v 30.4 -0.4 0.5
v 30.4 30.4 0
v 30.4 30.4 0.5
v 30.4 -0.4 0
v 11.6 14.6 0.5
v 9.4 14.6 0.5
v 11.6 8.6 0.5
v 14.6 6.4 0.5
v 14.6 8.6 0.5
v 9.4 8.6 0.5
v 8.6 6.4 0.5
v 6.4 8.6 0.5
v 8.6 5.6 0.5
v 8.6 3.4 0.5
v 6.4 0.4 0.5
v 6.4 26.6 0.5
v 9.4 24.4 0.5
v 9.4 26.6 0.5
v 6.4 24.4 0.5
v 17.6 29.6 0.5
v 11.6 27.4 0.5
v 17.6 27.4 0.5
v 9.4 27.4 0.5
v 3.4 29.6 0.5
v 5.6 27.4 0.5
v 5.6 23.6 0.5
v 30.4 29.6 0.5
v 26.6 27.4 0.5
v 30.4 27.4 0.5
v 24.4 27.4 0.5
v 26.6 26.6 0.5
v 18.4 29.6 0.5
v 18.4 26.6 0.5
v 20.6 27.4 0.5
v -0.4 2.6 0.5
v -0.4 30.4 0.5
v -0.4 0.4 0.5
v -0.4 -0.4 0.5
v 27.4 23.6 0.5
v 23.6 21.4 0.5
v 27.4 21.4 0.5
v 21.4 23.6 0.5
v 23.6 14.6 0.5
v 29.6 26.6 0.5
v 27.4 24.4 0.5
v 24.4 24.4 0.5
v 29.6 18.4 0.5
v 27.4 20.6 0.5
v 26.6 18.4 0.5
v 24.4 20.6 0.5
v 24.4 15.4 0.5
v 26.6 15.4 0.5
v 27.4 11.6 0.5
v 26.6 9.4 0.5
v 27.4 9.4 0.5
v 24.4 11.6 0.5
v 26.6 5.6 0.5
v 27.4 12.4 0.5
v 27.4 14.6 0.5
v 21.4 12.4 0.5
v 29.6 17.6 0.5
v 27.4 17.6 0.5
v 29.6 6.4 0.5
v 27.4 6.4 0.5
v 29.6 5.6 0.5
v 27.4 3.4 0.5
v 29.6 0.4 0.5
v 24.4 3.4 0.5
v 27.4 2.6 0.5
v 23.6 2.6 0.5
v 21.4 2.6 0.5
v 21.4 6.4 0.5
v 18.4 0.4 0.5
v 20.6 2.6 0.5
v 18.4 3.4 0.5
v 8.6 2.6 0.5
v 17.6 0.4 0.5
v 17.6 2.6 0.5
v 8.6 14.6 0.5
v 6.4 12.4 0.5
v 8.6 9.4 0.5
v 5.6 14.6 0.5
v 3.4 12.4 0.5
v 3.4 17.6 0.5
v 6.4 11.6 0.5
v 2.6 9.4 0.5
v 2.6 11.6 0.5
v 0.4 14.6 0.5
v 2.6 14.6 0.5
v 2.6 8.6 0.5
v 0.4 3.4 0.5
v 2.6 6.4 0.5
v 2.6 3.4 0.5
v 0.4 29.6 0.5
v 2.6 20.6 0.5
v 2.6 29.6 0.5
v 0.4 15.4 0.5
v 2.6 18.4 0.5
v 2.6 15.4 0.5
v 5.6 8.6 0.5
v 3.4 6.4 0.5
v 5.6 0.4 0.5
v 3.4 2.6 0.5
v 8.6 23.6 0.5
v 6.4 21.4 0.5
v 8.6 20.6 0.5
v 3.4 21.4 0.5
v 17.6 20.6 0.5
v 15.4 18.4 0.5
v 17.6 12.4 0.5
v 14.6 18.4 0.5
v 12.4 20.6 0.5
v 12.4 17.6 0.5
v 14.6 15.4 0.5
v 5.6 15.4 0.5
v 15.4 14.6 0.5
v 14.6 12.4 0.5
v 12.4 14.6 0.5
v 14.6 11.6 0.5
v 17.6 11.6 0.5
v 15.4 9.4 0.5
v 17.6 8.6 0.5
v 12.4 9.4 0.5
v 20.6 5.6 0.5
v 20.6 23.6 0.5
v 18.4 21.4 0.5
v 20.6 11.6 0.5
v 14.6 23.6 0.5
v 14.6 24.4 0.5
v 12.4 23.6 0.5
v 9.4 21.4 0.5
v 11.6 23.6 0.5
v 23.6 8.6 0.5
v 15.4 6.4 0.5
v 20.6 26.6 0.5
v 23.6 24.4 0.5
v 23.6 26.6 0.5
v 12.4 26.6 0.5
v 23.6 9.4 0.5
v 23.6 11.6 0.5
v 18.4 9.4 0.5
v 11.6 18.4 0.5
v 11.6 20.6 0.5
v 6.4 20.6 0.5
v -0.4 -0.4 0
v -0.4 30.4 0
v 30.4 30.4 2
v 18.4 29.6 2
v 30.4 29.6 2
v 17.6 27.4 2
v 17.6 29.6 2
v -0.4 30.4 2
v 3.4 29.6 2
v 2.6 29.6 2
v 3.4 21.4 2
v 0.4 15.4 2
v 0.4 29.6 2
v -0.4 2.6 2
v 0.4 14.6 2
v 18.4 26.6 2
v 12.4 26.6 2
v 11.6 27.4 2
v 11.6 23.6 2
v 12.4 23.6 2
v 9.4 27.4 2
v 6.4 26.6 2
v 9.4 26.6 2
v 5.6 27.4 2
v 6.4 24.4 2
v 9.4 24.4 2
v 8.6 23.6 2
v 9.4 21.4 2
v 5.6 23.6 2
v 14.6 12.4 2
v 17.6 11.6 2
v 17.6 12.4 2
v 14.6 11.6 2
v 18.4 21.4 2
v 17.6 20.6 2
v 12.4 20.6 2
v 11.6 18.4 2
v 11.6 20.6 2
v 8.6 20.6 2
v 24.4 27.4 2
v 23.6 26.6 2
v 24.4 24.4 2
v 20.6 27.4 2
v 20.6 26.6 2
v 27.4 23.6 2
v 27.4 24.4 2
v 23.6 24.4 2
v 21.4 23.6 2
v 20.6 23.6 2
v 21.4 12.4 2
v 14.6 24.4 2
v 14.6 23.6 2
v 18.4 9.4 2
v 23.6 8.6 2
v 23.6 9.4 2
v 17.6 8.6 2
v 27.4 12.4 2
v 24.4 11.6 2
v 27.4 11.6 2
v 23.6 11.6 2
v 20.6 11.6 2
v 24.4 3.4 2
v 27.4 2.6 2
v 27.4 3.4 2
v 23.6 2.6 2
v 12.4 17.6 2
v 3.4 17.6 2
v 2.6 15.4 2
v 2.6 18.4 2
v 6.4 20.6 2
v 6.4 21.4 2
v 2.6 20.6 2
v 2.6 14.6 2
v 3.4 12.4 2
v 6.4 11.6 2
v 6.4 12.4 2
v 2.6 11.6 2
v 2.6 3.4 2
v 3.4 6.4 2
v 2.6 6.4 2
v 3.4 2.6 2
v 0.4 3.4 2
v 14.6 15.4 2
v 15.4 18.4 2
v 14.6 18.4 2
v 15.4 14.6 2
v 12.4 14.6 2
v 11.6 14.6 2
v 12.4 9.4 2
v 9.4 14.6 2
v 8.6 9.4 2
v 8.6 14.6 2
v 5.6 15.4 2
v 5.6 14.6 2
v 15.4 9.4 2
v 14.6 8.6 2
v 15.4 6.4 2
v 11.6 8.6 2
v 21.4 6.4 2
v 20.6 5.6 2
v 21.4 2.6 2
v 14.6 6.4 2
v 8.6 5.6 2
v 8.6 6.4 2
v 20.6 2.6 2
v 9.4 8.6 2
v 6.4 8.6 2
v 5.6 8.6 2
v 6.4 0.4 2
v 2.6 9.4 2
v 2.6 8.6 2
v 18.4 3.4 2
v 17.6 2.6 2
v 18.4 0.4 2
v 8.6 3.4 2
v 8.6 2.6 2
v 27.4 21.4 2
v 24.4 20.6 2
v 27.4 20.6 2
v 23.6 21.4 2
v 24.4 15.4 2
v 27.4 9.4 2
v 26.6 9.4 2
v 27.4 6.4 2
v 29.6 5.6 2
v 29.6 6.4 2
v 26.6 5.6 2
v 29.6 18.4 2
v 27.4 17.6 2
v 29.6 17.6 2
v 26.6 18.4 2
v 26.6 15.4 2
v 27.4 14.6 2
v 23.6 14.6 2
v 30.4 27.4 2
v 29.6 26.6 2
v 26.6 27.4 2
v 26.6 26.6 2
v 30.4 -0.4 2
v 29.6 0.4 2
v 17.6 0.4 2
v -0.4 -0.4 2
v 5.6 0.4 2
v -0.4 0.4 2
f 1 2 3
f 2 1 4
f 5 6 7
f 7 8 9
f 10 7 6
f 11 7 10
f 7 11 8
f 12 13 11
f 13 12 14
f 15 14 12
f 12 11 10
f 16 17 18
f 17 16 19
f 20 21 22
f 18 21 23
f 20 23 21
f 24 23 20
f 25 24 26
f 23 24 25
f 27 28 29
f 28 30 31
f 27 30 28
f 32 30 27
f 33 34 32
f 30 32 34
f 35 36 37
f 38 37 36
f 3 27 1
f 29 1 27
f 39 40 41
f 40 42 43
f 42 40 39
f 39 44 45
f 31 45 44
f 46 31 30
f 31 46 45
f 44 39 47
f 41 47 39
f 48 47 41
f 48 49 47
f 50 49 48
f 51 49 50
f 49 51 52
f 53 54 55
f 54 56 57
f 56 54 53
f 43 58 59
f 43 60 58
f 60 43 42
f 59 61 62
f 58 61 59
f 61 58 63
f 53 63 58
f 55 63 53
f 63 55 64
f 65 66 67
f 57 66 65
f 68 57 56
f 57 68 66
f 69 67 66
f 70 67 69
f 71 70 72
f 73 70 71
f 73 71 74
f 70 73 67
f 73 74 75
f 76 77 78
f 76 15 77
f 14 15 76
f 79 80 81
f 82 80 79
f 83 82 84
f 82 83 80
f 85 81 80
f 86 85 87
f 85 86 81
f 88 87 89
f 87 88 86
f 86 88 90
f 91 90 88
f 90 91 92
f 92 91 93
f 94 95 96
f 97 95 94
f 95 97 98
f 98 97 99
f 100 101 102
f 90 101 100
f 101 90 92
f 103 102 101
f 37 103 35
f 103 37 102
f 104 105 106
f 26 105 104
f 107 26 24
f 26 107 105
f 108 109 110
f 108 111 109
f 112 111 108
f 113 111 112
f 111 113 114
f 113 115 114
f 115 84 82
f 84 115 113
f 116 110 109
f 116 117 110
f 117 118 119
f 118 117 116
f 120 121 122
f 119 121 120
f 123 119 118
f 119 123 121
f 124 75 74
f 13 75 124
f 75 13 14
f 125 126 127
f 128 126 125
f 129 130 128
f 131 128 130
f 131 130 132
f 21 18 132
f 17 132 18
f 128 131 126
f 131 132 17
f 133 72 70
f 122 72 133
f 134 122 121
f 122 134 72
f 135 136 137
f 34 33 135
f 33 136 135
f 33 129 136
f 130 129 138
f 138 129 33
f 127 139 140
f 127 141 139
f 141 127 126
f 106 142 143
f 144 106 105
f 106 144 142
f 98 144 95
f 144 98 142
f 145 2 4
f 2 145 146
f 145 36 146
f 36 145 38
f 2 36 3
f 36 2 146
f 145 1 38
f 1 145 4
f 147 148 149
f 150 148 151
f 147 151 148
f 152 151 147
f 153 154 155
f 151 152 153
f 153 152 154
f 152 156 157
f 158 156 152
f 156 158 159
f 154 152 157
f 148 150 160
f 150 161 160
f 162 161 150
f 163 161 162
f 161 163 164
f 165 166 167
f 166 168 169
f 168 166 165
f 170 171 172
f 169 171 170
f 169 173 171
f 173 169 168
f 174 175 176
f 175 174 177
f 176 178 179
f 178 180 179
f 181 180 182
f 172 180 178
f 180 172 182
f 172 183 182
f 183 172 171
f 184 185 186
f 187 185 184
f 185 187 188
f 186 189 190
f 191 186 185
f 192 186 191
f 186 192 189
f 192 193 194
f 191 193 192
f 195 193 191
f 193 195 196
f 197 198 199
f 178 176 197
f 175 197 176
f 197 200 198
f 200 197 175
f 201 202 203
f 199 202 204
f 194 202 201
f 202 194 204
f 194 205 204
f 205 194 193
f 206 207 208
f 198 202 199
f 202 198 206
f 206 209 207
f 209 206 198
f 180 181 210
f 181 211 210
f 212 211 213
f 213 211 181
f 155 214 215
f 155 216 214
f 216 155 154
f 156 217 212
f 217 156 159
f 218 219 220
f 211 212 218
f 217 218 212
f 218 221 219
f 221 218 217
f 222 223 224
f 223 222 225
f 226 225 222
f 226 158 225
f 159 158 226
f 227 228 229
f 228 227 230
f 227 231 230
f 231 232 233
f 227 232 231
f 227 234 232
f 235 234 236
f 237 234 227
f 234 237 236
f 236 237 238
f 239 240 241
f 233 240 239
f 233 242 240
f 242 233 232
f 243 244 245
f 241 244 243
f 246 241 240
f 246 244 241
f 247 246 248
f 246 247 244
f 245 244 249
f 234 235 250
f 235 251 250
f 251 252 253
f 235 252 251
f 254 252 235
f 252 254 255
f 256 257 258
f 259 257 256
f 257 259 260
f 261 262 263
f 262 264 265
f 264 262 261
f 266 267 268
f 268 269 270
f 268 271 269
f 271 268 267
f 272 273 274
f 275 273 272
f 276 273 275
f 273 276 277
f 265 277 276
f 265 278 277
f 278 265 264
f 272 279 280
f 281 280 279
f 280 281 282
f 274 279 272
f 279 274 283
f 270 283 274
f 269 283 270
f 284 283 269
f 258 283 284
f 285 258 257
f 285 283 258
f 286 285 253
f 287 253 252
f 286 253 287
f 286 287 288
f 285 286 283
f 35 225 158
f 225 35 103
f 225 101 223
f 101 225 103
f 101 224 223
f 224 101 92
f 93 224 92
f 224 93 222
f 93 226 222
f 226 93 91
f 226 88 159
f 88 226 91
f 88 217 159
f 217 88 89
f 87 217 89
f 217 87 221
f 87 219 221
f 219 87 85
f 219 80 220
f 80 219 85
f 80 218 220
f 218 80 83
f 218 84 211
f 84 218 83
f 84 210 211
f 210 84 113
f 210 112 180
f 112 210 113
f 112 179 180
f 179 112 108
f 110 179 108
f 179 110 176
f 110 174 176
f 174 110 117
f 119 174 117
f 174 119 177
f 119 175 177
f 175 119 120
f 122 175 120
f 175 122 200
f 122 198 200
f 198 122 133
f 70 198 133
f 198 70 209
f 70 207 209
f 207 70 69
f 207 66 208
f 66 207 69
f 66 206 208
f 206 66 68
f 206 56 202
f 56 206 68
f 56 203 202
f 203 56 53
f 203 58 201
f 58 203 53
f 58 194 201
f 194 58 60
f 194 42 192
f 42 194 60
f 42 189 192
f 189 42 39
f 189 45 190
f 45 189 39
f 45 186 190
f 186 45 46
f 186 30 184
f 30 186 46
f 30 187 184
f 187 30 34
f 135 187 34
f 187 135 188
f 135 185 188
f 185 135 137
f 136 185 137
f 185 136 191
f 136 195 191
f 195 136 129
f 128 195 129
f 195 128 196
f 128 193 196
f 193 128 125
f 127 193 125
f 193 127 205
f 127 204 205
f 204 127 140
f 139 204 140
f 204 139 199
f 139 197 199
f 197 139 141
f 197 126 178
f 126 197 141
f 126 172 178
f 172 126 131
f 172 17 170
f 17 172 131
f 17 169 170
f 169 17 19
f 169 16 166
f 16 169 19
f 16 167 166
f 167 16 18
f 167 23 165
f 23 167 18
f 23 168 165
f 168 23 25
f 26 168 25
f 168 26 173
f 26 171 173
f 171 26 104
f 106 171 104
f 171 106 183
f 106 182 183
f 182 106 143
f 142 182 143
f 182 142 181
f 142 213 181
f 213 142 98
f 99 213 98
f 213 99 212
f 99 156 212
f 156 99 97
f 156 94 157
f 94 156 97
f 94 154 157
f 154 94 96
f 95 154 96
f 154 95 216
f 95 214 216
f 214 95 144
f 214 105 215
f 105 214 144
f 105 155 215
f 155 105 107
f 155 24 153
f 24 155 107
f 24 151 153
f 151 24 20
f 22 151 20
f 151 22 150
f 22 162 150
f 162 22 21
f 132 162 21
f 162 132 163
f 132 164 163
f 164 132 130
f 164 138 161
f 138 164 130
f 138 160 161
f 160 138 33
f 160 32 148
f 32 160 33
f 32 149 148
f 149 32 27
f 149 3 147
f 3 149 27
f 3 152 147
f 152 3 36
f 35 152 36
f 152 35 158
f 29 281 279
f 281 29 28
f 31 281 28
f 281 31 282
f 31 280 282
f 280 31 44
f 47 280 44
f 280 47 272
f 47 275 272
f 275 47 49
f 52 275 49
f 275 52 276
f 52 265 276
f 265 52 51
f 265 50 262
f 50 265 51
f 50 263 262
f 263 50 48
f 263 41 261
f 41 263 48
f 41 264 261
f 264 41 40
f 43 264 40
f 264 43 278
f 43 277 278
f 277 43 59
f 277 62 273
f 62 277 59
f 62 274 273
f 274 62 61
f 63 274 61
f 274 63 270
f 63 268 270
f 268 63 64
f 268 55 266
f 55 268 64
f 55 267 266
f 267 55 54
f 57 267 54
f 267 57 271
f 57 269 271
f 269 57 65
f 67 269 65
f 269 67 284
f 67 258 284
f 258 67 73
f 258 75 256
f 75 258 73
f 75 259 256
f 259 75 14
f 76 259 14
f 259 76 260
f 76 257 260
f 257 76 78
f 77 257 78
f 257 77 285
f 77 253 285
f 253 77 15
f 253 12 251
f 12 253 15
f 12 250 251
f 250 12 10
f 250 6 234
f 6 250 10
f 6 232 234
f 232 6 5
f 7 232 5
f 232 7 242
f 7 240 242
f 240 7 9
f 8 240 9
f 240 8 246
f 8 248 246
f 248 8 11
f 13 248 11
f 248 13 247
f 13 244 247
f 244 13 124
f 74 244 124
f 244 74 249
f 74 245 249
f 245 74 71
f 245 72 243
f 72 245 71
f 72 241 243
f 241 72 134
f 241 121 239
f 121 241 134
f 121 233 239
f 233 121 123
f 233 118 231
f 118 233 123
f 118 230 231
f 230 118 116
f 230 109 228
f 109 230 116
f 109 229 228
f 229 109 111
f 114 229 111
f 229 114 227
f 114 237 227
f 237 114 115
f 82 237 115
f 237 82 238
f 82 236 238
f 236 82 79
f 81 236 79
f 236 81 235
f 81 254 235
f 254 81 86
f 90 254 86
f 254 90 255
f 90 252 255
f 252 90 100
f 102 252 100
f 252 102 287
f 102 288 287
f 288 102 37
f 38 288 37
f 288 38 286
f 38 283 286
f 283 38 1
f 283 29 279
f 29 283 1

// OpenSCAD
//random maze generator with back
//Mark G. Peeters added back and commnents 1-12-16
//http://www.thingiverse.com/thing:1264082
//Original work by JustinSDK
//https://www.thingiverse.com/thing:1185425
//preview[view:south, tilt:top]
//Y direction
rows = 10;
//x direction
columns = 10;

wall_thickness = 0.8;
wall_height = 2;
block_width = 3;
base_thickness=0.5;

/*hidden*/
echo("maze size X=",columns*block_width+wall_thickness);
echo("maze size Y=",rows*block_width+wall_thickness);
echo("maze path width=",block_width-wall_thickness);
translate([-wall_thickness/2,-wall_thickness/2,0])cube([columns*block_width+wall_thickness,rows*block_width+wall_thickness,base_thickness]);


/*
 * constants, for clearness
 *
 */
 #translate([-wall_thickness/2,-wall_thickness/2,0])cube([columns*block_width+wall_thickness,rows*block_width+wall_thickness,base_thickness]);
 
 
// random directions, for picking up a direction to visit the next block
function PERMUTATION_OF_FOUR() = [
    [1, 2, 3, 4],
    [1, 2, 4, 3],
    [1, 3, 2, 4],
    [1, 3, 4, 2],
    [1, 4, 2, 3],
    [1, 4, 3, 2],
    [2, 1, 3, 4],
    [2, 1, 4, 3],
    [2, 3, 1, 4],
    [2, 3, 4, 1],
    [2, 4, 1, 3],
    [2, 4, 3, 1],
    [3, 1, 2, 4],
    [3, 1, 4, 2],
    [3, 2, 1, 4],
    [3, 2, 4, 1],
    [3, 4, 1, 2],
    [3, 4, 2, 1],
    [4, 1, 2, 3],
    [4, 1, 3, 2],
    [4, 2, 1, 3],
    [4, 2, 3, 1],
    [4, 3, 1, 2],
    [4, 3, 2, 1]
];

function NO_WALL() = 0;
function UP_WALL() = 1;
function RIGHT_WALL() = 2;
function UP_RIGHT_WALL() = 3;

function NOT_VISITED() = 0;
function VISITED() = 1;

/* 
 * modules for creating a maze
 *
 */

// give a [x, y] point and length. draw a line in the x direction
module x_line(point, length, thickness = 1) {
    offset = thickness / 2;
    translate([point[0] - offset, point[1] - offset, 0]) 
        square([length + thickness, thickness]);
}

// give a [x, y] point and length. draw a line in the y direction
module y_line(point, length, thickness = 1) {
    offset = thickness / 2;
    translate([point[0] - offset, point[1] - offset, 0])  
        square([thickness, length + thickness]);
}

// create the outer wall of maze
module maze_outer_wall(rows, columns, block_width = 5, wall_thickness = 1) {
    x_line([0, rows * block_width], columns * block_width, wall_thickness);
    y_line([0, block_width], (rows - 1) * block_width, wall_thickness);
}

// create the inner wall of maze
module maze_inner_wall(maze, block_width = 5, wall_thickness = 1) {
    for(i = [0:len(maze) - 1]) {
        cord = maze[i];
        x = (cord[0] - 1) * block_width;
        y = (cord[1] - 1) * block_width;
        v = cord[3];
        
        if(v == 1 || v == 3) {
            x_line([x, y], block_width, wall_thickness);
        }
        if(v == 2 || v == 3) {
            y_line([x + block_width, y], block_width, wall_thickness);
        }
    }  
}

// create a maze
module maze(rows, columns, maze_vector, block_width = 5, wall_thickness = 1) {
     maze_outer_wall(rows, columns, block_width, wall_thickness);
     maze_inner_wall(maze_vector, block_width, wall_thickness);
}

/* 
 * utilities functions
 *
 */

// comare the equality of [x1, y1] and [x2, y2]
function cord_equals(cord1, cord2) = cord1 == cord2;

// is the point visited?
function not_visited(cord, vs, index = 0) =
    index == len(vs) ? true : 
        (cord_equals([vs[index][0], vs[index][1]], cord) && vs[index][2] == 1 ? false :
            not_visited(cord, vs, index + 1));
            
// pick a direction randomly
function rand_dirs() =
    PERMUTATION_OF_FOUR()[round(rands(0, 24, 1)[0])]; 

// give a index (exclusivly), slice a vector 
function head_to(i, vs) =
    i >= len(vs) ? vs : (
        i == 0 ? [] : concat(head_to(i - 1, vs), [vs[i - 1]])
    );

// give a index (exclusivly), slice a vector 
function tail_from(i, vs, index = 0, new_vs = []) =
    i >= len(vs) ? [] : (
        index < i ? tail_from(i, vs, index + 1) : (
            index < len(vs) ? tail_from(i, vs, index + 1, concat(new_vs, [vs[index]])) : new_vs
        )
    );

// replace v1 in the vector with v2 
function replace(v1, v2, vs, index = 0) =
    index == len(vs) ? vs : (
        vs[index] == v1 ? concat(concat(head_to(index, vs), [v2]), tail_from(index + 1, vs)) : replace(v1, v2, vs, index + 1)
    );
    
/* 
 * functions for generating a maze vector
 *
 */

// initialize rows of a maze
function init_row(n, length) =
    length == 0 ? [] : concat(init_row(n, length - 1), [[length, n, 0, UP_RIGHT_WALL()]]);
    
// initialize a maze
function init_maze(rows, columns) =
    rows == 0 ? [] : concat(init_maze(rows - 1, columns), init_row(rows, columns));
    
// find a vector in the maze vector
function find(i, j, maze_vector, index = 0) =
    index == len(maze_vector) ? [] : (
        cord_equals([i, j], [maze_vector[index][0], maze_vector[index][1]]) ? maze_vector[index] : find(i, j, maze_vector, index + 1)
    );

////
// NO_WALL = 0;
// UP_WALL = 1;
// RIGHT_WALL = 2;
// UP_RIGHT_WALL = 3;
function delete_right_wall(original_block) = 
    original_block == NO_WALL() || original_block == RIGHT_WALL() ? NO_WALL() : UP_WALL();

function delete_up_wall(original_block) = 
    (original_block == NO_WALL() || original_block == UP_WALL()) ? NO_WALL() : RIGHT_WALL();
    
function delete_right_wall_of(vs, is_visited, maze_vector) =
    replace(vs, [vs[0], vs[1] , is_visited, delete_right_wall(vs[3])] ,maze_vector);

function delete_up_wall_of(vs, is_visited, maze_vector) =
    replace(vs, [vs[0], vs[1] , is_visited, delete_up_wall(vs[3])] ,maze_vector);

function go_right(i, j, rows, columns, maze_vector) =
    go_maze(i + 1, j, rows, columns, delete_right_wall_of(find(i, j, maze_vector), VISITED(), maze_vector));
    
function go_up(i, j, rows, columns, maze_vector) =
    go_maze(i, j - 1, rows, columns, delete_up_wall_of(find(i, j, maze_vector), VISITED(), maze_vector));
    
function visit(v, maze_vector) =
    replace(v, [v[0], v[1], VISITED(), v[3]], maze_vector);
 
function go_left(i, j, rows, columns, maze_vector) =
    go_maze(i - 1, j, rows, columns, delete_right_wall_of(find(i - 1, j, maze_vector), NOT_VISITED(), maze_vector));
    
function go_down(i, j, rows, columns, maze_vector) =
    go_maze(i, j + 1, rows, columns, delete_up_wall_of(find(i, j + 1, maze_vector), NOT_VISITED(), maze_vector));
    
function go_maze(i, j, rows, columns, maze_vector) =
    look_around(i, j, rand_dirs(), rows, columns, visit(find(i, j, maze_vector), maze_vector));
    
function look_around(i, j, dirs, rows, columns, maze_vector, index = 0) =
    index == 4 ? maze_vector : 
        look_around( 
            i, j, dirs, 
            rows, columns, 
            build_wall(i, j, dirs[index], rows, columns, maze_vector), 
            index + 1
        ); 

function build_wall(i, j, n, rows, columns, maze_vector) = 
    n == 1 && i != columns && not_visited([i + 1, j], maze_vector) ? go_right(i, j, rows, columns, maze_vector) : ( 
        n == 2 && j != 1 && not_visited([i, j - 1], maze_vector) ? go_up(i, j, rows, columns, maze_vector)  : (
            n == 3 && i != 1 && not_visited([i - 1, j], maze_vector) ? go_left(i, j,rows, columns,  maze_vector)  : (
                n == 4 && j != rows && not_visited([i, j + 1], maze_vector) ? go_down(i, j, rows, columns, maze_vector) : maze_vector
            ) 
        )
    ); 
 
/*
 * create a maze
 *
 */
maze_vector = go_maze(1, 1, rows, columns, replace([columns, rows, 0, UP_RIGHT_WALL()], [columns, rows, 0, UP_WALL()], init_maze(rows, columns)));
linear_extrude(wall_height) 
    maze(rows, columns, maze_vector, block_width, wall_thickness);
